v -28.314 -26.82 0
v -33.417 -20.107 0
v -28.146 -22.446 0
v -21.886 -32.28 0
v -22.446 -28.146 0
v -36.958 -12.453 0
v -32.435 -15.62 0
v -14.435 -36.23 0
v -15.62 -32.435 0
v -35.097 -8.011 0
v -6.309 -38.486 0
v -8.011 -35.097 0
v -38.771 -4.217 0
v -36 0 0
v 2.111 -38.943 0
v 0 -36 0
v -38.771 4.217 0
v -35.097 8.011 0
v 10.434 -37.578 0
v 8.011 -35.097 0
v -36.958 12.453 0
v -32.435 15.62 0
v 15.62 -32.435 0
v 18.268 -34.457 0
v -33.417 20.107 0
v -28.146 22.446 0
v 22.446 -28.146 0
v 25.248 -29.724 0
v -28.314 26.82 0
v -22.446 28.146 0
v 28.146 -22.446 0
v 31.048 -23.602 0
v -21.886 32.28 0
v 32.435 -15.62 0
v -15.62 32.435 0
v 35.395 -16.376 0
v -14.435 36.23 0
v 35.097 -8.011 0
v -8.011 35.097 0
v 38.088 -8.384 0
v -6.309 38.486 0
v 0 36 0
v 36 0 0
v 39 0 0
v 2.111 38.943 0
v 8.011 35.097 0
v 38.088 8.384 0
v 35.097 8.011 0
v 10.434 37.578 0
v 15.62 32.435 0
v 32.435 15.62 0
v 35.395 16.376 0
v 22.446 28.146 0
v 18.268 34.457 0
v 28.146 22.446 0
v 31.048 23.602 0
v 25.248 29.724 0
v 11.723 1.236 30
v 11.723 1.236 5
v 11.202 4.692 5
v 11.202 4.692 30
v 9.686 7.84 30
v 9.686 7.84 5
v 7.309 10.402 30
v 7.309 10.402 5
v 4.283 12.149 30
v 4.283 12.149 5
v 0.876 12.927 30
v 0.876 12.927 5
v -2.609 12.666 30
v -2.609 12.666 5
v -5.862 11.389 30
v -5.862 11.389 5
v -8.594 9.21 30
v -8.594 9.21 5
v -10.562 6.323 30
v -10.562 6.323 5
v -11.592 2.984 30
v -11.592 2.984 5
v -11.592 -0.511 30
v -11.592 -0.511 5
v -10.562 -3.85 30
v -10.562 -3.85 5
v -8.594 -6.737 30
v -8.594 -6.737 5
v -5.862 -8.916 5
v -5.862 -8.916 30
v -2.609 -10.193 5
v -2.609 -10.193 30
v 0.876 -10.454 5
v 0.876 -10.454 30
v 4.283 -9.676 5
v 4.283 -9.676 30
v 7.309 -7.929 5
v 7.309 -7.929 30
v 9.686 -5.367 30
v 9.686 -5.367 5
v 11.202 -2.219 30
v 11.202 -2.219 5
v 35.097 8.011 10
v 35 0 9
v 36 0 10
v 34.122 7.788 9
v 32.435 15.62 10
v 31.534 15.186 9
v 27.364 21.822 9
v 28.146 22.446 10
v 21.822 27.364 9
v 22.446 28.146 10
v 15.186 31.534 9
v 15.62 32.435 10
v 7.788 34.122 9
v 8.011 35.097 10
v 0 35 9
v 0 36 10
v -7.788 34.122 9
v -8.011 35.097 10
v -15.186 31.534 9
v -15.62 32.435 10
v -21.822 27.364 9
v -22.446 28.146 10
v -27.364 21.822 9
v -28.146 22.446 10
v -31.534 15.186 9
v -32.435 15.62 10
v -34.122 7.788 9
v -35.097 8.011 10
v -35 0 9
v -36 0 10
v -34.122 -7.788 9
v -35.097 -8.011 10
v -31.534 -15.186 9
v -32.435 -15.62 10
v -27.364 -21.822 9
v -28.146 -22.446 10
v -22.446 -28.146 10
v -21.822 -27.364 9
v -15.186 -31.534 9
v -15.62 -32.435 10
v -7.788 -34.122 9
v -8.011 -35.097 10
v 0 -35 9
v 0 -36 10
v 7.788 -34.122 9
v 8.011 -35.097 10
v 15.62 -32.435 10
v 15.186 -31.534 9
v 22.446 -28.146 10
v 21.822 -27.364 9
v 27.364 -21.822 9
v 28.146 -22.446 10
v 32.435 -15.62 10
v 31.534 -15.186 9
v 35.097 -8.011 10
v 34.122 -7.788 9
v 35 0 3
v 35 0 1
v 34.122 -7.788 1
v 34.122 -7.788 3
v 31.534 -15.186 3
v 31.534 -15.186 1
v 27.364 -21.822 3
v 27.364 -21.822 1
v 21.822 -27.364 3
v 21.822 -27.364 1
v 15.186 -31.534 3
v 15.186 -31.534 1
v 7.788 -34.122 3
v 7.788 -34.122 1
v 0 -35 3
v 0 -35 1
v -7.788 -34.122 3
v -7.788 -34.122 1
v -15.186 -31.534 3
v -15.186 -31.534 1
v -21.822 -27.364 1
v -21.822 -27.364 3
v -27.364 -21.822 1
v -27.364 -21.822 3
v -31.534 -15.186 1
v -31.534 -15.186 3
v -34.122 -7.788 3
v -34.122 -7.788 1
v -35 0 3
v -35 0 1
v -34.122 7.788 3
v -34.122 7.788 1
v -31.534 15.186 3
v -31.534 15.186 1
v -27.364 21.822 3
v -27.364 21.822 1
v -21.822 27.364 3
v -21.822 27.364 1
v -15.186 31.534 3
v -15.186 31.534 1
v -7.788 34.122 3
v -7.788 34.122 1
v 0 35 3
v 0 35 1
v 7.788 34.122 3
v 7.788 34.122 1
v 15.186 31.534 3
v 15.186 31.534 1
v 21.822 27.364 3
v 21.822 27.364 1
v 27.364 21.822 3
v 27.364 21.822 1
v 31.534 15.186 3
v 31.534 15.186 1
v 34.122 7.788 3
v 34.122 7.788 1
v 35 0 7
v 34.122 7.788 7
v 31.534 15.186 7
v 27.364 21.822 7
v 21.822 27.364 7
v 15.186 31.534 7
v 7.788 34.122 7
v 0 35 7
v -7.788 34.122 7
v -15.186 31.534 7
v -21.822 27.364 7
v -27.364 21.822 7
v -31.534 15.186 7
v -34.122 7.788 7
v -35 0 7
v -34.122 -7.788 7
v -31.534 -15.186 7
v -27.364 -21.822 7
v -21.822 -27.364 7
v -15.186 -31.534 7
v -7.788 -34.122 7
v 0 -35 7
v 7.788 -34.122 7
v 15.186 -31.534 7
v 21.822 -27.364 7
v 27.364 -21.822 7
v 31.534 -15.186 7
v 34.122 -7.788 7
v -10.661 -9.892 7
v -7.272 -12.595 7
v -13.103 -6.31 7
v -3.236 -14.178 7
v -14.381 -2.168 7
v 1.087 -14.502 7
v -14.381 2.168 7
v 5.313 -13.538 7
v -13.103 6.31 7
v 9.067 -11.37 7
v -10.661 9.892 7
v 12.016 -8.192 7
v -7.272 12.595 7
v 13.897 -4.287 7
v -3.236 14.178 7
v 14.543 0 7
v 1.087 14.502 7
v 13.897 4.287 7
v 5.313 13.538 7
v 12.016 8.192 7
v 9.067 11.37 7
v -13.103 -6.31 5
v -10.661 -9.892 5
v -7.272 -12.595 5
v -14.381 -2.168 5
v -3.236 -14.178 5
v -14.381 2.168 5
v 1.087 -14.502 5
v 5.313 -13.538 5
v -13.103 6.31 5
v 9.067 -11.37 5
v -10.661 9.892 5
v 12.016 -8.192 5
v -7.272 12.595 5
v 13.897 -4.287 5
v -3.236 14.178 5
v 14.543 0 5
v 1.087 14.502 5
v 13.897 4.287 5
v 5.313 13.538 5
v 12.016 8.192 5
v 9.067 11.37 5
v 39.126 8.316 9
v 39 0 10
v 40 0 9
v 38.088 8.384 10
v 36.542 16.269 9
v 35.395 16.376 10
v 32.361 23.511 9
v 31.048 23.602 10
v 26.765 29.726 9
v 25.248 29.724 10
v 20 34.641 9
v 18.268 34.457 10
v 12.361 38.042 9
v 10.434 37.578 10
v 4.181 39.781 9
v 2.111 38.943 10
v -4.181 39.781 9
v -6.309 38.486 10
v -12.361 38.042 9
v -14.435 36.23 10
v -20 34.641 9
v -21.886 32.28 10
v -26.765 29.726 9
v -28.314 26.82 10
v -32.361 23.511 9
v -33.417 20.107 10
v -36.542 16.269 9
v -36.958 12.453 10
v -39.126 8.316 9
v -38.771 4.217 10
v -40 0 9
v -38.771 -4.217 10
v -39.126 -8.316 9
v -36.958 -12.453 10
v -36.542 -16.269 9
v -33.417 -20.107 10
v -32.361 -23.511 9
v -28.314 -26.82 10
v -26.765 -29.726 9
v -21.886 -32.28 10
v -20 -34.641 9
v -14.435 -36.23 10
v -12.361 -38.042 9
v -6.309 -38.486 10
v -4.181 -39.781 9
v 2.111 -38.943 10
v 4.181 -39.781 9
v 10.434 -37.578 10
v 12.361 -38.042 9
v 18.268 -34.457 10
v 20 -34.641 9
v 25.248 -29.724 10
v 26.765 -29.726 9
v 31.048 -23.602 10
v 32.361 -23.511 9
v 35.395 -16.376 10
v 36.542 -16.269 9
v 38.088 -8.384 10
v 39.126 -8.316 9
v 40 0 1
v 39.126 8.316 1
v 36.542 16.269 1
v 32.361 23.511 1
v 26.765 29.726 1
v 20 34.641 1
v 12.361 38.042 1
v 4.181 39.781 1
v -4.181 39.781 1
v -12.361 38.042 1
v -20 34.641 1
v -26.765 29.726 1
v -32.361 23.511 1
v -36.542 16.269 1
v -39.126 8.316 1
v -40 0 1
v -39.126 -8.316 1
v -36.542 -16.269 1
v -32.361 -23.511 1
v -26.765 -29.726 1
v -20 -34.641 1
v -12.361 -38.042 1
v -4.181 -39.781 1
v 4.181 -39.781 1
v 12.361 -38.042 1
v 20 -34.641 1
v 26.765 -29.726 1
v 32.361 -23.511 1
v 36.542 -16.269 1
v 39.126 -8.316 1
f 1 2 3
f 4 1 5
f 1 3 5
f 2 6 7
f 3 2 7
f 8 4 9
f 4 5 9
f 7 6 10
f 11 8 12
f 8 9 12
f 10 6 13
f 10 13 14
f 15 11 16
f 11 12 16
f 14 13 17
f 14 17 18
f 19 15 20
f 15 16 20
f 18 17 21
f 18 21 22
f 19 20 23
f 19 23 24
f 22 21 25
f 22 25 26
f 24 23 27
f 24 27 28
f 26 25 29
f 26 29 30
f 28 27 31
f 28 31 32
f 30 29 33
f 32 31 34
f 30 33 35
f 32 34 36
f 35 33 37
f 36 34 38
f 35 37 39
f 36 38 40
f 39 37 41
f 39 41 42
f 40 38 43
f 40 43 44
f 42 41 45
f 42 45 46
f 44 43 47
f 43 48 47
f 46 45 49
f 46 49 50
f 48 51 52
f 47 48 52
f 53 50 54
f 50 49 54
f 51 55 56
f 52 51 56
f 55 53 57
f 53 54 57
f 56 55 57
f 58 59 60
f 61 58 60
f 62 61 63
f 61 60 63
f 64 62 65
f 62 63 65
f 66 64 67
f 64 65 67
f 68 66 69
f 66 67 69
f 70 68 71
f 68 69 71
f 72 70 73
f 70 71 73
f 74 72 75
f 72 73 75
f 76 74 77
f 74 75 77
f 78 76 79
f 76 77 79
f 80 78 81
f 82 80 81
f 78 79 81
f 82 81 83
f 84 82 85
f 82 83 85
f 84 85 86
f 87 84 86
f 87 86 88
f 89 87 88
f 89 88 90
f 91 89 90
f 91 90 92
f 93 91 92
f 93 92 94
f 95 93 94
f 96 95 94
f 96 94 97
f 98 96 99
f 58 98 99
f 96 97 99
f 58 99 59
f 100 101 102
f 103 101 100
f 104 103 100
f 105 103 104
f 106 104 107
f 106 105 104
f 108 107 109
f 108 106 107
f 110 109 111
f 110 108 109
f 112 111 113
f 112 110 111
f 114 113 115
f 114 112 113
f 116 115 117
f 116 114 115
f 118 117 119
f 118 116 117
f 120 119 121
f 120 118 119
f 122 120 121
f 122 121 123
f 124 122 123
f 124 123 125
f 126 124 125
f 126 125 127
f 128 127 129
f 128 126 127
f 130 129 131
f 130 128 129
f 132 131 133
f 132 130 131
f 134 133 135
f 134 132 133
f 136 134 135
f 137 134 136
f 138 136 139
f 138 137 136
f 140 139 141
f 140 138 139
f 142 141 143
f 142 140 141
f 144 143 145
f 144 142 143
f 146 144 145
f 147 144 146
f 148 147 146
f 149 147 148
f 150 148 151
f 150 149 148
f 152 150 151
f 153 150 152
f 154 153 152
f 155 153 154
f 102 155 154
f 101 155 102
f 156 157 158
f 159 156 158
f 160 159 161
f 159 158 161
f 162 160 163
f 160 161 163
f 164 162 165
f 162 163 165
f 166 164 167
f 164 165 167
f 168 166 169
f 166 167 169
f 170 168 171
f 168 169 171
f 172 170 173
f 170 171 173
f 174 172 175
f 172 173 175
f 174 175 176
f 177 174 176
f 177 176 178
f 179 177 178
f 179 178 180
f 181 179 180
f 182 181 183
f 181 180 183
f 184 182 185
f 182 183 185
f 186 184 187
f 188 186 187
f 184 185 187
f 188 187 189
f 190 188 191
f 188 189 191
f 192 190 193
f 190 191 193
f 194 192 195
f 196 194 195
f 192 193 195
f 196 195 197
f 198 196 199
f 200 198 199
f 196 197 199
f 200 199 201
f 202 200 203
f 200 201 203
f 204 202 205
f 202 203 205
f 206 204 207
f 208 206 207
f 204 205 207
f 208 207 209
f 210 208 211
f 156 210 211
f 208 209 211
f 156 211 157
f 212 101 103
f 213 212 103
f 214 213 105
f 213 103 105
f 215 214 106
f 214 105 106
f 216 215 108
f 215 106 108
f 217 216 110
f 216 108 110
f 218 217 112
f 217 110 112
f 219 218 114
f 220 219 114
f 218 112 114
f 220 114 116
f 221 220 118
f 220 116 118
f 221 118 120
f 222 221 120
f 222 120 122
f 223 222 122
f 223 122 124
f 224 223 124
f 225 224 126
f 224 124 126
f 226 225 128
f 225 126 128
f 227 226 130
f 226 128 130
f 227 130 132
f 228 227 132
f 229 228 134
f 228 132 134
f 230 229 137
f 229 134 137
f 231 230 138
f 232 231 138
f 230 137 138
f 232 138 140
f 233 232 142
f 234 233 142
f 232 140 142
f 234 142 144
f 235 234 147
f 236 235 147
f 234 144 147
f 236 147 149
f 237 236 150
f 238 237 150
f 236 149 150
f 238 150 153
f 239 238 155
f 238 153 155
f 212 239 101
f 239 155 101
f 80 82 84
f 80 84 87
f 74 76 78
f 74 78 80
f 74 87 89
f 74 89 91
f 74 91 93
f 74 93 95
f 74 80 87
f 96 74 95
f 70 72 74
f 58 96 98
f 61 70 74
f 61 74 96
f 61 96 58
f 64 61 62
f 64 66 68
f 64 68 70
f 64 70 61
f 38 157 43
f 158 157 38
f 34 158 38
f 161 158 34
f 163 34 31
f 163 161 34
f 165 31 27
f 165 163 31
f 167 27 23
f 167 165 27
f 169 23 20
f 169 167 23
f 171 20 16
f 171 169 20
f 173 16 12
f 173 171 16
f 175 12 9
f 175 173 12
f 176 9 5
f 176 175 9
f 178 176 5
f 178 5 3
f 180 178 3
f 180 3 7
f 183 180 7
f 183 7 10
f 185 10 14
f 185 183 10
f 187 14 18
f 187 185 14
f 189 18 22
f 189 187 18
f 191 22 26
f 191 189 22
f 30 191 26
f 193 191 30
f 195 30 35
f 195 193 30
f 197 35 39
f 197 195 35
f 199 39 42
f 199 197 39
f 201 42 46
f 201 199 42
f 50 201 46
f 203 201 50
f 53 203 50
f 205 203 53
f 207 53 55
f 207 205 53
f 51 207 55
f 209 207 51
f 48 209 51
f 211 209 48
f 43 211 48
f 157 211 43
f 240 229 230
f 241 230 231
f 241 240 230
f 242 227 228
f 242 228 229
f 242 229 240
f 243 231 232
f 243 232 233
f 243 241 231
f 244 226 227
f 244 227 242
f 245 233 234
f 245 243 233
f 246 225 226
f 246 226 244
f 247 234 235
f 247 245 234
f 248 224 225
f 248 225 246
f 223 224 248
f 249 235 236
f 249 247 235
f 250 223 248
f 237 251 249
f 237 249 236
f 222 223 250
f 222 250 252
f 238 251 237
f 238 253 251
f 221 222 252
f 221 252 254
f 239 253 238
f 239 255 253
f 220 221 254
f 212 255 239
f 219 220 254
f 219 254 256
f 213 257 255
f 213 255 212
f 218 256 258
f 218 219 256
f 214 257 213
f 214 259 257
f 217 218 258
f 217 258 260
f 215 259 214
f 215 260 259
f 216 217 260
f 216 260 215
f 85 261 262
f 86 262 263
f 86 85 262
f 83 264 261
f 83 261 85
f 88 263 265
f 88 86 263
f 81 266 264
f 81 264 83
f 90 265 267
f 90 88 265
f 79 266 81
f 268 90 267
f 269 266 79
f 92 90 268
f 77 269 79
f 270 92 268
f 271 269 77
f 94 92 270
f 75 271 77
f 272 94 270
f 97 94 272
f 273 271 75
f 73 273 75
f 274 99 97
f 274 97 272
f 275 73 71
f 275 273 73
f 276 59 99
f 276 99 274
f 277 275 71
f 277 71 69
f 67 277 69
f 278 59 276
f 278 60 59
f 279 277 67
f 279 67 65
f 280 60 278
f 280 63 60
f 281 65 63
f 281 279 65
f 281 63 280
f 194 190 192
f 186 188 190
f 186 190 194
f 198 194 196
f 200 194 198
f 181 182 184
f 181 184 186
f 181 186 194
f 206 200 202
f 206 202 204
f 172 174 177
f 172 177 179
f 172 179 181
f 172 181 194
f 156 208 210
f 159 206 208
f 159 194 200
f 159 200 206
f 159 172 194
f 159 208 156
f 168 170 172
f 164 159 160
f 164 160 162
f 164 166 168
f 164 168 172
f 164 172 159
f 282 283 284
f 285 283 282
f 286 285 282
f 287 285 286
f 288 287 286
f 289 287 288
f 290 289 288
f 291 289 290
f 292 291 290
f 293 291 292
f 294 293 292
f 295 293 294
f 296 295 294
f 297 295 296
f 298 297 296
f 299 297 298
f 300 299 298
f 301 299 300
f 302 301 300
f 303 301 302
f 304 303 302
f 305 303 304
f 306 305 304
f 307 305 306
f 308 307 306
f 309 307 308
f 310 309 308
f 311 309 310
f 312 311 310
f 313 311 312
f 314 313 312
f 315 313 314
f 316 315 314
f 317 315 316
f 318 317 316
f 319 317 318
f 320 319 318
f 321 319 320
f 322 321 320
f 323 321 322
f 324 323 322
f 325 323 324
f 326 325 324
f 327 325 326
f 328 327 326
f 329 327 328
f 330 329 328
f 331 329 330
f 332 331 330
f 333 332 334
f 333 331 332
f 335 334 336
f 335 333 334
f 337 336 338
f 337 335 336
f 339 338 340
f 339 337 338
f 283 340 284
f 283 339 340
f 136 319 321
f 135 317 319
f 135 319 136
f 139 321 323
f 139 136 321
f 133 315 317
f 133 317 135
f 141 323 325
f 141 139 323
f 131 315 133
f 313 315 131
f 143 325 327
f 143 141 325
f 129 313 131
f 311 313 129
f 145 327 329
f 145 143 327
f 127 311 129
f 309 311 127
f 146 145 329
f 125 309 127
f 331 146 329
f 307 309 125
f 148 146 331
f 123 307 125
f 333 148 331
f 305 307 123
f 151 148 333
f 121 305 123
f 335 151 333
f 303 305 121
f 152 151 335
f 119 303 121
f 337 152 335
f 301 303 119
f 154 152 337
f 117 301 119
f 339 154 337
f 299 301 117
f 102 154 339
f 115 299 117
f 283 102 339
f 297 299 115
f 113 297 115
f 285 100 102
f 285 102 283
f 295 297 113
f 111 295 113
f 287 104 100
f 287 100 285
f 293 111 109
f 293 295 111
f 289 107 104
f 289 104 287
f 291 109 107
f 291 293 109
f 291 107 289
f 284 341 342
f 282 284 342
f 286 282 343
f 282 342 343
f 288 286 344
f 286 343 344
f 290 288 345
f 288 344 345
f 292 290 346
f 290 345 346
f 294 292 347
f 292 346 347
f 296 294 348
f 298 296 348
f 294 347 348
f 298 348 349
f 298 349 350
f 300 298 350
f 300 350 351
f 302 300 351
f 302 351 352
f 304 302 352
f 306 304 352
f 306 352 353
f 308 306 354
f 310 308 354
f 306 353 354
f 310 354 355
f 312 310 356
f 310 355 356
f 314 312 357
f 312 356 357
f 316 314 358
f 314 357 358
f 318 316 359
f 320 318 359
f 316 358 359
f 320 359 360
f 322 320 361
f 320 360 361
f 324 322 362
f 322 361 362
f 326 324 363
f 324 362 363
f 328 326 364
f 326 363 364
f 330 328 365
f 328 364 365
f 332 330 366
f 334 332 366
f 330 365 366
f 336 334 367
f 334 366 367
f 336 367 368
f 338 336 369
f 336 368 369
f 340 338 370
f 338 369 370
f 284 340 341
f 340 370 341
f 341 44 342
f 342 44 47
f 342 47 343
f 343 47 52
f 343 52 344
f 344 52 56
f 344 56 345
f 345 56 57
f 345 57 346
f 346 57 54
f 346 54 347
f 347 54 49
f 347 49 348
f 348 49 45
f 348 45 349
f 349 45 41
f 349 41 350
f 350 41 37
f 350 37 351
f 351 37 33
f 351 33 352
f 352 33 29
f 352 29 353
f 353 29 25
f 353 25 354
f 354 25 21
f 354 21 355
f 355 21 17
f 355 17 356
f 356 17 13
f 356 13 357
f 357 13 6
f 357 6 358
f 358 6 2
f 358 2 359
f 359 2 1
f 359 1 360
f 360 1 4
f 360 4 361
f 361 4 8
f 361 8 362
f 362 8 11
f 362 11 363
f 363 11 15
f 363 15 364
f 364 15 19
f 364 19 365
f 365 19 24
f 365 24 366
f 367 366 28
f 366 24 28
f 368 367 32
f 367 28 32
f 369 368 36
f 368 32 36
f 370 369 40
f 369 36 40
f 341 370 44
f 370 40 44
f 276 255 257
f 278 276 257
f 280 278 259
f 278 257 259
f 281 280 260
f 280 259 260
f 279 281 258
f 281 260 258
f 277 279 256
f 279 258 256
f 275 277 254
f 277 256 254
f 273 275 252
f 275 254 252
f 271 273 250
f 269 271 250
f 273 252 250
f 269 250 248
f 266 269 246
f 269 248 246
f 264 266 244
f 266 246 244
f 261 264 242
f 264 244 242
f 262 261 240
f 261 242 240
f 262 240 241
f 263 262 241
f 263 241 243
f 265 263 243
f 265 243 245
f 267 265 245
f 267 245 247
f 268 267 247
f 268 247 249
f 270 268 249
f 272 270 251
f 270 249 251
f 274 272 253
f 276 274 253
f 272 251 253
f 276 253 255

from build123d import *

# Parameters (mm, degrees)
F0_R      = 40
F1_DEPTH  = 10
F2_R      = 35
F3_DEPTH  = 3
F4_R      = 35
F5_DEPTH  = 3
F6_SIZE   = 1
F7_R      = 14.543107
F8_DEPTH  = 2
F9_R      = 11.723212
F10_DEPTH = 25


with BuildPart() as f1:
    # F0 (on Top) → F1 (new body)
    with BuildSketch(Plane.XY):
        Circle(F0_R)
    extrude(amount=F1_DEPTH)

    # F2 (on face) → F3 (cut)
    with BuildSketch(Plane.XY.offset(10)):
        Circle(F2_R)
    extrude(amount=-F3_DEPTH, mode=Mode.SUBTRACT)

    # F4 (on face) → F5 (cut)
    with BuildSketch(Plane(origin=(0, 0, 0), x_dir=(1, 0, 0), z_dir=(0, 0, -1))):
        Circle(F4_R)
    extrude(amount=-F5_DEPTH, mode=Mode.SUBTRACT)

    # F6
    f6_edges = [f1.edges().sort_by_distance(p)[0] for p in [
        (-35, 0, 10),
        (-40, 0, 10),
        (-40, 0, 0),
        (-35, 0, 0),
    ]]
    chamfer(f6_edges, length=F6_SIZE)

    # F7 (on face) → F8 (cut)
    with BuildSketch(Plane.XY.offset(7)):
        Circle(F7_R)
    extrude(amount=-F8_DEPTH, mode=Mode.SUBTRACT)

    # F9 (on face) → F10 (join)
    with BuildSketch(Plane.XY.offset(5)):
        with Locations((0, 1.236479)):
            Circle(F9_R)
    extrude(amount=F10_DEPTH)


solid = f1.part
